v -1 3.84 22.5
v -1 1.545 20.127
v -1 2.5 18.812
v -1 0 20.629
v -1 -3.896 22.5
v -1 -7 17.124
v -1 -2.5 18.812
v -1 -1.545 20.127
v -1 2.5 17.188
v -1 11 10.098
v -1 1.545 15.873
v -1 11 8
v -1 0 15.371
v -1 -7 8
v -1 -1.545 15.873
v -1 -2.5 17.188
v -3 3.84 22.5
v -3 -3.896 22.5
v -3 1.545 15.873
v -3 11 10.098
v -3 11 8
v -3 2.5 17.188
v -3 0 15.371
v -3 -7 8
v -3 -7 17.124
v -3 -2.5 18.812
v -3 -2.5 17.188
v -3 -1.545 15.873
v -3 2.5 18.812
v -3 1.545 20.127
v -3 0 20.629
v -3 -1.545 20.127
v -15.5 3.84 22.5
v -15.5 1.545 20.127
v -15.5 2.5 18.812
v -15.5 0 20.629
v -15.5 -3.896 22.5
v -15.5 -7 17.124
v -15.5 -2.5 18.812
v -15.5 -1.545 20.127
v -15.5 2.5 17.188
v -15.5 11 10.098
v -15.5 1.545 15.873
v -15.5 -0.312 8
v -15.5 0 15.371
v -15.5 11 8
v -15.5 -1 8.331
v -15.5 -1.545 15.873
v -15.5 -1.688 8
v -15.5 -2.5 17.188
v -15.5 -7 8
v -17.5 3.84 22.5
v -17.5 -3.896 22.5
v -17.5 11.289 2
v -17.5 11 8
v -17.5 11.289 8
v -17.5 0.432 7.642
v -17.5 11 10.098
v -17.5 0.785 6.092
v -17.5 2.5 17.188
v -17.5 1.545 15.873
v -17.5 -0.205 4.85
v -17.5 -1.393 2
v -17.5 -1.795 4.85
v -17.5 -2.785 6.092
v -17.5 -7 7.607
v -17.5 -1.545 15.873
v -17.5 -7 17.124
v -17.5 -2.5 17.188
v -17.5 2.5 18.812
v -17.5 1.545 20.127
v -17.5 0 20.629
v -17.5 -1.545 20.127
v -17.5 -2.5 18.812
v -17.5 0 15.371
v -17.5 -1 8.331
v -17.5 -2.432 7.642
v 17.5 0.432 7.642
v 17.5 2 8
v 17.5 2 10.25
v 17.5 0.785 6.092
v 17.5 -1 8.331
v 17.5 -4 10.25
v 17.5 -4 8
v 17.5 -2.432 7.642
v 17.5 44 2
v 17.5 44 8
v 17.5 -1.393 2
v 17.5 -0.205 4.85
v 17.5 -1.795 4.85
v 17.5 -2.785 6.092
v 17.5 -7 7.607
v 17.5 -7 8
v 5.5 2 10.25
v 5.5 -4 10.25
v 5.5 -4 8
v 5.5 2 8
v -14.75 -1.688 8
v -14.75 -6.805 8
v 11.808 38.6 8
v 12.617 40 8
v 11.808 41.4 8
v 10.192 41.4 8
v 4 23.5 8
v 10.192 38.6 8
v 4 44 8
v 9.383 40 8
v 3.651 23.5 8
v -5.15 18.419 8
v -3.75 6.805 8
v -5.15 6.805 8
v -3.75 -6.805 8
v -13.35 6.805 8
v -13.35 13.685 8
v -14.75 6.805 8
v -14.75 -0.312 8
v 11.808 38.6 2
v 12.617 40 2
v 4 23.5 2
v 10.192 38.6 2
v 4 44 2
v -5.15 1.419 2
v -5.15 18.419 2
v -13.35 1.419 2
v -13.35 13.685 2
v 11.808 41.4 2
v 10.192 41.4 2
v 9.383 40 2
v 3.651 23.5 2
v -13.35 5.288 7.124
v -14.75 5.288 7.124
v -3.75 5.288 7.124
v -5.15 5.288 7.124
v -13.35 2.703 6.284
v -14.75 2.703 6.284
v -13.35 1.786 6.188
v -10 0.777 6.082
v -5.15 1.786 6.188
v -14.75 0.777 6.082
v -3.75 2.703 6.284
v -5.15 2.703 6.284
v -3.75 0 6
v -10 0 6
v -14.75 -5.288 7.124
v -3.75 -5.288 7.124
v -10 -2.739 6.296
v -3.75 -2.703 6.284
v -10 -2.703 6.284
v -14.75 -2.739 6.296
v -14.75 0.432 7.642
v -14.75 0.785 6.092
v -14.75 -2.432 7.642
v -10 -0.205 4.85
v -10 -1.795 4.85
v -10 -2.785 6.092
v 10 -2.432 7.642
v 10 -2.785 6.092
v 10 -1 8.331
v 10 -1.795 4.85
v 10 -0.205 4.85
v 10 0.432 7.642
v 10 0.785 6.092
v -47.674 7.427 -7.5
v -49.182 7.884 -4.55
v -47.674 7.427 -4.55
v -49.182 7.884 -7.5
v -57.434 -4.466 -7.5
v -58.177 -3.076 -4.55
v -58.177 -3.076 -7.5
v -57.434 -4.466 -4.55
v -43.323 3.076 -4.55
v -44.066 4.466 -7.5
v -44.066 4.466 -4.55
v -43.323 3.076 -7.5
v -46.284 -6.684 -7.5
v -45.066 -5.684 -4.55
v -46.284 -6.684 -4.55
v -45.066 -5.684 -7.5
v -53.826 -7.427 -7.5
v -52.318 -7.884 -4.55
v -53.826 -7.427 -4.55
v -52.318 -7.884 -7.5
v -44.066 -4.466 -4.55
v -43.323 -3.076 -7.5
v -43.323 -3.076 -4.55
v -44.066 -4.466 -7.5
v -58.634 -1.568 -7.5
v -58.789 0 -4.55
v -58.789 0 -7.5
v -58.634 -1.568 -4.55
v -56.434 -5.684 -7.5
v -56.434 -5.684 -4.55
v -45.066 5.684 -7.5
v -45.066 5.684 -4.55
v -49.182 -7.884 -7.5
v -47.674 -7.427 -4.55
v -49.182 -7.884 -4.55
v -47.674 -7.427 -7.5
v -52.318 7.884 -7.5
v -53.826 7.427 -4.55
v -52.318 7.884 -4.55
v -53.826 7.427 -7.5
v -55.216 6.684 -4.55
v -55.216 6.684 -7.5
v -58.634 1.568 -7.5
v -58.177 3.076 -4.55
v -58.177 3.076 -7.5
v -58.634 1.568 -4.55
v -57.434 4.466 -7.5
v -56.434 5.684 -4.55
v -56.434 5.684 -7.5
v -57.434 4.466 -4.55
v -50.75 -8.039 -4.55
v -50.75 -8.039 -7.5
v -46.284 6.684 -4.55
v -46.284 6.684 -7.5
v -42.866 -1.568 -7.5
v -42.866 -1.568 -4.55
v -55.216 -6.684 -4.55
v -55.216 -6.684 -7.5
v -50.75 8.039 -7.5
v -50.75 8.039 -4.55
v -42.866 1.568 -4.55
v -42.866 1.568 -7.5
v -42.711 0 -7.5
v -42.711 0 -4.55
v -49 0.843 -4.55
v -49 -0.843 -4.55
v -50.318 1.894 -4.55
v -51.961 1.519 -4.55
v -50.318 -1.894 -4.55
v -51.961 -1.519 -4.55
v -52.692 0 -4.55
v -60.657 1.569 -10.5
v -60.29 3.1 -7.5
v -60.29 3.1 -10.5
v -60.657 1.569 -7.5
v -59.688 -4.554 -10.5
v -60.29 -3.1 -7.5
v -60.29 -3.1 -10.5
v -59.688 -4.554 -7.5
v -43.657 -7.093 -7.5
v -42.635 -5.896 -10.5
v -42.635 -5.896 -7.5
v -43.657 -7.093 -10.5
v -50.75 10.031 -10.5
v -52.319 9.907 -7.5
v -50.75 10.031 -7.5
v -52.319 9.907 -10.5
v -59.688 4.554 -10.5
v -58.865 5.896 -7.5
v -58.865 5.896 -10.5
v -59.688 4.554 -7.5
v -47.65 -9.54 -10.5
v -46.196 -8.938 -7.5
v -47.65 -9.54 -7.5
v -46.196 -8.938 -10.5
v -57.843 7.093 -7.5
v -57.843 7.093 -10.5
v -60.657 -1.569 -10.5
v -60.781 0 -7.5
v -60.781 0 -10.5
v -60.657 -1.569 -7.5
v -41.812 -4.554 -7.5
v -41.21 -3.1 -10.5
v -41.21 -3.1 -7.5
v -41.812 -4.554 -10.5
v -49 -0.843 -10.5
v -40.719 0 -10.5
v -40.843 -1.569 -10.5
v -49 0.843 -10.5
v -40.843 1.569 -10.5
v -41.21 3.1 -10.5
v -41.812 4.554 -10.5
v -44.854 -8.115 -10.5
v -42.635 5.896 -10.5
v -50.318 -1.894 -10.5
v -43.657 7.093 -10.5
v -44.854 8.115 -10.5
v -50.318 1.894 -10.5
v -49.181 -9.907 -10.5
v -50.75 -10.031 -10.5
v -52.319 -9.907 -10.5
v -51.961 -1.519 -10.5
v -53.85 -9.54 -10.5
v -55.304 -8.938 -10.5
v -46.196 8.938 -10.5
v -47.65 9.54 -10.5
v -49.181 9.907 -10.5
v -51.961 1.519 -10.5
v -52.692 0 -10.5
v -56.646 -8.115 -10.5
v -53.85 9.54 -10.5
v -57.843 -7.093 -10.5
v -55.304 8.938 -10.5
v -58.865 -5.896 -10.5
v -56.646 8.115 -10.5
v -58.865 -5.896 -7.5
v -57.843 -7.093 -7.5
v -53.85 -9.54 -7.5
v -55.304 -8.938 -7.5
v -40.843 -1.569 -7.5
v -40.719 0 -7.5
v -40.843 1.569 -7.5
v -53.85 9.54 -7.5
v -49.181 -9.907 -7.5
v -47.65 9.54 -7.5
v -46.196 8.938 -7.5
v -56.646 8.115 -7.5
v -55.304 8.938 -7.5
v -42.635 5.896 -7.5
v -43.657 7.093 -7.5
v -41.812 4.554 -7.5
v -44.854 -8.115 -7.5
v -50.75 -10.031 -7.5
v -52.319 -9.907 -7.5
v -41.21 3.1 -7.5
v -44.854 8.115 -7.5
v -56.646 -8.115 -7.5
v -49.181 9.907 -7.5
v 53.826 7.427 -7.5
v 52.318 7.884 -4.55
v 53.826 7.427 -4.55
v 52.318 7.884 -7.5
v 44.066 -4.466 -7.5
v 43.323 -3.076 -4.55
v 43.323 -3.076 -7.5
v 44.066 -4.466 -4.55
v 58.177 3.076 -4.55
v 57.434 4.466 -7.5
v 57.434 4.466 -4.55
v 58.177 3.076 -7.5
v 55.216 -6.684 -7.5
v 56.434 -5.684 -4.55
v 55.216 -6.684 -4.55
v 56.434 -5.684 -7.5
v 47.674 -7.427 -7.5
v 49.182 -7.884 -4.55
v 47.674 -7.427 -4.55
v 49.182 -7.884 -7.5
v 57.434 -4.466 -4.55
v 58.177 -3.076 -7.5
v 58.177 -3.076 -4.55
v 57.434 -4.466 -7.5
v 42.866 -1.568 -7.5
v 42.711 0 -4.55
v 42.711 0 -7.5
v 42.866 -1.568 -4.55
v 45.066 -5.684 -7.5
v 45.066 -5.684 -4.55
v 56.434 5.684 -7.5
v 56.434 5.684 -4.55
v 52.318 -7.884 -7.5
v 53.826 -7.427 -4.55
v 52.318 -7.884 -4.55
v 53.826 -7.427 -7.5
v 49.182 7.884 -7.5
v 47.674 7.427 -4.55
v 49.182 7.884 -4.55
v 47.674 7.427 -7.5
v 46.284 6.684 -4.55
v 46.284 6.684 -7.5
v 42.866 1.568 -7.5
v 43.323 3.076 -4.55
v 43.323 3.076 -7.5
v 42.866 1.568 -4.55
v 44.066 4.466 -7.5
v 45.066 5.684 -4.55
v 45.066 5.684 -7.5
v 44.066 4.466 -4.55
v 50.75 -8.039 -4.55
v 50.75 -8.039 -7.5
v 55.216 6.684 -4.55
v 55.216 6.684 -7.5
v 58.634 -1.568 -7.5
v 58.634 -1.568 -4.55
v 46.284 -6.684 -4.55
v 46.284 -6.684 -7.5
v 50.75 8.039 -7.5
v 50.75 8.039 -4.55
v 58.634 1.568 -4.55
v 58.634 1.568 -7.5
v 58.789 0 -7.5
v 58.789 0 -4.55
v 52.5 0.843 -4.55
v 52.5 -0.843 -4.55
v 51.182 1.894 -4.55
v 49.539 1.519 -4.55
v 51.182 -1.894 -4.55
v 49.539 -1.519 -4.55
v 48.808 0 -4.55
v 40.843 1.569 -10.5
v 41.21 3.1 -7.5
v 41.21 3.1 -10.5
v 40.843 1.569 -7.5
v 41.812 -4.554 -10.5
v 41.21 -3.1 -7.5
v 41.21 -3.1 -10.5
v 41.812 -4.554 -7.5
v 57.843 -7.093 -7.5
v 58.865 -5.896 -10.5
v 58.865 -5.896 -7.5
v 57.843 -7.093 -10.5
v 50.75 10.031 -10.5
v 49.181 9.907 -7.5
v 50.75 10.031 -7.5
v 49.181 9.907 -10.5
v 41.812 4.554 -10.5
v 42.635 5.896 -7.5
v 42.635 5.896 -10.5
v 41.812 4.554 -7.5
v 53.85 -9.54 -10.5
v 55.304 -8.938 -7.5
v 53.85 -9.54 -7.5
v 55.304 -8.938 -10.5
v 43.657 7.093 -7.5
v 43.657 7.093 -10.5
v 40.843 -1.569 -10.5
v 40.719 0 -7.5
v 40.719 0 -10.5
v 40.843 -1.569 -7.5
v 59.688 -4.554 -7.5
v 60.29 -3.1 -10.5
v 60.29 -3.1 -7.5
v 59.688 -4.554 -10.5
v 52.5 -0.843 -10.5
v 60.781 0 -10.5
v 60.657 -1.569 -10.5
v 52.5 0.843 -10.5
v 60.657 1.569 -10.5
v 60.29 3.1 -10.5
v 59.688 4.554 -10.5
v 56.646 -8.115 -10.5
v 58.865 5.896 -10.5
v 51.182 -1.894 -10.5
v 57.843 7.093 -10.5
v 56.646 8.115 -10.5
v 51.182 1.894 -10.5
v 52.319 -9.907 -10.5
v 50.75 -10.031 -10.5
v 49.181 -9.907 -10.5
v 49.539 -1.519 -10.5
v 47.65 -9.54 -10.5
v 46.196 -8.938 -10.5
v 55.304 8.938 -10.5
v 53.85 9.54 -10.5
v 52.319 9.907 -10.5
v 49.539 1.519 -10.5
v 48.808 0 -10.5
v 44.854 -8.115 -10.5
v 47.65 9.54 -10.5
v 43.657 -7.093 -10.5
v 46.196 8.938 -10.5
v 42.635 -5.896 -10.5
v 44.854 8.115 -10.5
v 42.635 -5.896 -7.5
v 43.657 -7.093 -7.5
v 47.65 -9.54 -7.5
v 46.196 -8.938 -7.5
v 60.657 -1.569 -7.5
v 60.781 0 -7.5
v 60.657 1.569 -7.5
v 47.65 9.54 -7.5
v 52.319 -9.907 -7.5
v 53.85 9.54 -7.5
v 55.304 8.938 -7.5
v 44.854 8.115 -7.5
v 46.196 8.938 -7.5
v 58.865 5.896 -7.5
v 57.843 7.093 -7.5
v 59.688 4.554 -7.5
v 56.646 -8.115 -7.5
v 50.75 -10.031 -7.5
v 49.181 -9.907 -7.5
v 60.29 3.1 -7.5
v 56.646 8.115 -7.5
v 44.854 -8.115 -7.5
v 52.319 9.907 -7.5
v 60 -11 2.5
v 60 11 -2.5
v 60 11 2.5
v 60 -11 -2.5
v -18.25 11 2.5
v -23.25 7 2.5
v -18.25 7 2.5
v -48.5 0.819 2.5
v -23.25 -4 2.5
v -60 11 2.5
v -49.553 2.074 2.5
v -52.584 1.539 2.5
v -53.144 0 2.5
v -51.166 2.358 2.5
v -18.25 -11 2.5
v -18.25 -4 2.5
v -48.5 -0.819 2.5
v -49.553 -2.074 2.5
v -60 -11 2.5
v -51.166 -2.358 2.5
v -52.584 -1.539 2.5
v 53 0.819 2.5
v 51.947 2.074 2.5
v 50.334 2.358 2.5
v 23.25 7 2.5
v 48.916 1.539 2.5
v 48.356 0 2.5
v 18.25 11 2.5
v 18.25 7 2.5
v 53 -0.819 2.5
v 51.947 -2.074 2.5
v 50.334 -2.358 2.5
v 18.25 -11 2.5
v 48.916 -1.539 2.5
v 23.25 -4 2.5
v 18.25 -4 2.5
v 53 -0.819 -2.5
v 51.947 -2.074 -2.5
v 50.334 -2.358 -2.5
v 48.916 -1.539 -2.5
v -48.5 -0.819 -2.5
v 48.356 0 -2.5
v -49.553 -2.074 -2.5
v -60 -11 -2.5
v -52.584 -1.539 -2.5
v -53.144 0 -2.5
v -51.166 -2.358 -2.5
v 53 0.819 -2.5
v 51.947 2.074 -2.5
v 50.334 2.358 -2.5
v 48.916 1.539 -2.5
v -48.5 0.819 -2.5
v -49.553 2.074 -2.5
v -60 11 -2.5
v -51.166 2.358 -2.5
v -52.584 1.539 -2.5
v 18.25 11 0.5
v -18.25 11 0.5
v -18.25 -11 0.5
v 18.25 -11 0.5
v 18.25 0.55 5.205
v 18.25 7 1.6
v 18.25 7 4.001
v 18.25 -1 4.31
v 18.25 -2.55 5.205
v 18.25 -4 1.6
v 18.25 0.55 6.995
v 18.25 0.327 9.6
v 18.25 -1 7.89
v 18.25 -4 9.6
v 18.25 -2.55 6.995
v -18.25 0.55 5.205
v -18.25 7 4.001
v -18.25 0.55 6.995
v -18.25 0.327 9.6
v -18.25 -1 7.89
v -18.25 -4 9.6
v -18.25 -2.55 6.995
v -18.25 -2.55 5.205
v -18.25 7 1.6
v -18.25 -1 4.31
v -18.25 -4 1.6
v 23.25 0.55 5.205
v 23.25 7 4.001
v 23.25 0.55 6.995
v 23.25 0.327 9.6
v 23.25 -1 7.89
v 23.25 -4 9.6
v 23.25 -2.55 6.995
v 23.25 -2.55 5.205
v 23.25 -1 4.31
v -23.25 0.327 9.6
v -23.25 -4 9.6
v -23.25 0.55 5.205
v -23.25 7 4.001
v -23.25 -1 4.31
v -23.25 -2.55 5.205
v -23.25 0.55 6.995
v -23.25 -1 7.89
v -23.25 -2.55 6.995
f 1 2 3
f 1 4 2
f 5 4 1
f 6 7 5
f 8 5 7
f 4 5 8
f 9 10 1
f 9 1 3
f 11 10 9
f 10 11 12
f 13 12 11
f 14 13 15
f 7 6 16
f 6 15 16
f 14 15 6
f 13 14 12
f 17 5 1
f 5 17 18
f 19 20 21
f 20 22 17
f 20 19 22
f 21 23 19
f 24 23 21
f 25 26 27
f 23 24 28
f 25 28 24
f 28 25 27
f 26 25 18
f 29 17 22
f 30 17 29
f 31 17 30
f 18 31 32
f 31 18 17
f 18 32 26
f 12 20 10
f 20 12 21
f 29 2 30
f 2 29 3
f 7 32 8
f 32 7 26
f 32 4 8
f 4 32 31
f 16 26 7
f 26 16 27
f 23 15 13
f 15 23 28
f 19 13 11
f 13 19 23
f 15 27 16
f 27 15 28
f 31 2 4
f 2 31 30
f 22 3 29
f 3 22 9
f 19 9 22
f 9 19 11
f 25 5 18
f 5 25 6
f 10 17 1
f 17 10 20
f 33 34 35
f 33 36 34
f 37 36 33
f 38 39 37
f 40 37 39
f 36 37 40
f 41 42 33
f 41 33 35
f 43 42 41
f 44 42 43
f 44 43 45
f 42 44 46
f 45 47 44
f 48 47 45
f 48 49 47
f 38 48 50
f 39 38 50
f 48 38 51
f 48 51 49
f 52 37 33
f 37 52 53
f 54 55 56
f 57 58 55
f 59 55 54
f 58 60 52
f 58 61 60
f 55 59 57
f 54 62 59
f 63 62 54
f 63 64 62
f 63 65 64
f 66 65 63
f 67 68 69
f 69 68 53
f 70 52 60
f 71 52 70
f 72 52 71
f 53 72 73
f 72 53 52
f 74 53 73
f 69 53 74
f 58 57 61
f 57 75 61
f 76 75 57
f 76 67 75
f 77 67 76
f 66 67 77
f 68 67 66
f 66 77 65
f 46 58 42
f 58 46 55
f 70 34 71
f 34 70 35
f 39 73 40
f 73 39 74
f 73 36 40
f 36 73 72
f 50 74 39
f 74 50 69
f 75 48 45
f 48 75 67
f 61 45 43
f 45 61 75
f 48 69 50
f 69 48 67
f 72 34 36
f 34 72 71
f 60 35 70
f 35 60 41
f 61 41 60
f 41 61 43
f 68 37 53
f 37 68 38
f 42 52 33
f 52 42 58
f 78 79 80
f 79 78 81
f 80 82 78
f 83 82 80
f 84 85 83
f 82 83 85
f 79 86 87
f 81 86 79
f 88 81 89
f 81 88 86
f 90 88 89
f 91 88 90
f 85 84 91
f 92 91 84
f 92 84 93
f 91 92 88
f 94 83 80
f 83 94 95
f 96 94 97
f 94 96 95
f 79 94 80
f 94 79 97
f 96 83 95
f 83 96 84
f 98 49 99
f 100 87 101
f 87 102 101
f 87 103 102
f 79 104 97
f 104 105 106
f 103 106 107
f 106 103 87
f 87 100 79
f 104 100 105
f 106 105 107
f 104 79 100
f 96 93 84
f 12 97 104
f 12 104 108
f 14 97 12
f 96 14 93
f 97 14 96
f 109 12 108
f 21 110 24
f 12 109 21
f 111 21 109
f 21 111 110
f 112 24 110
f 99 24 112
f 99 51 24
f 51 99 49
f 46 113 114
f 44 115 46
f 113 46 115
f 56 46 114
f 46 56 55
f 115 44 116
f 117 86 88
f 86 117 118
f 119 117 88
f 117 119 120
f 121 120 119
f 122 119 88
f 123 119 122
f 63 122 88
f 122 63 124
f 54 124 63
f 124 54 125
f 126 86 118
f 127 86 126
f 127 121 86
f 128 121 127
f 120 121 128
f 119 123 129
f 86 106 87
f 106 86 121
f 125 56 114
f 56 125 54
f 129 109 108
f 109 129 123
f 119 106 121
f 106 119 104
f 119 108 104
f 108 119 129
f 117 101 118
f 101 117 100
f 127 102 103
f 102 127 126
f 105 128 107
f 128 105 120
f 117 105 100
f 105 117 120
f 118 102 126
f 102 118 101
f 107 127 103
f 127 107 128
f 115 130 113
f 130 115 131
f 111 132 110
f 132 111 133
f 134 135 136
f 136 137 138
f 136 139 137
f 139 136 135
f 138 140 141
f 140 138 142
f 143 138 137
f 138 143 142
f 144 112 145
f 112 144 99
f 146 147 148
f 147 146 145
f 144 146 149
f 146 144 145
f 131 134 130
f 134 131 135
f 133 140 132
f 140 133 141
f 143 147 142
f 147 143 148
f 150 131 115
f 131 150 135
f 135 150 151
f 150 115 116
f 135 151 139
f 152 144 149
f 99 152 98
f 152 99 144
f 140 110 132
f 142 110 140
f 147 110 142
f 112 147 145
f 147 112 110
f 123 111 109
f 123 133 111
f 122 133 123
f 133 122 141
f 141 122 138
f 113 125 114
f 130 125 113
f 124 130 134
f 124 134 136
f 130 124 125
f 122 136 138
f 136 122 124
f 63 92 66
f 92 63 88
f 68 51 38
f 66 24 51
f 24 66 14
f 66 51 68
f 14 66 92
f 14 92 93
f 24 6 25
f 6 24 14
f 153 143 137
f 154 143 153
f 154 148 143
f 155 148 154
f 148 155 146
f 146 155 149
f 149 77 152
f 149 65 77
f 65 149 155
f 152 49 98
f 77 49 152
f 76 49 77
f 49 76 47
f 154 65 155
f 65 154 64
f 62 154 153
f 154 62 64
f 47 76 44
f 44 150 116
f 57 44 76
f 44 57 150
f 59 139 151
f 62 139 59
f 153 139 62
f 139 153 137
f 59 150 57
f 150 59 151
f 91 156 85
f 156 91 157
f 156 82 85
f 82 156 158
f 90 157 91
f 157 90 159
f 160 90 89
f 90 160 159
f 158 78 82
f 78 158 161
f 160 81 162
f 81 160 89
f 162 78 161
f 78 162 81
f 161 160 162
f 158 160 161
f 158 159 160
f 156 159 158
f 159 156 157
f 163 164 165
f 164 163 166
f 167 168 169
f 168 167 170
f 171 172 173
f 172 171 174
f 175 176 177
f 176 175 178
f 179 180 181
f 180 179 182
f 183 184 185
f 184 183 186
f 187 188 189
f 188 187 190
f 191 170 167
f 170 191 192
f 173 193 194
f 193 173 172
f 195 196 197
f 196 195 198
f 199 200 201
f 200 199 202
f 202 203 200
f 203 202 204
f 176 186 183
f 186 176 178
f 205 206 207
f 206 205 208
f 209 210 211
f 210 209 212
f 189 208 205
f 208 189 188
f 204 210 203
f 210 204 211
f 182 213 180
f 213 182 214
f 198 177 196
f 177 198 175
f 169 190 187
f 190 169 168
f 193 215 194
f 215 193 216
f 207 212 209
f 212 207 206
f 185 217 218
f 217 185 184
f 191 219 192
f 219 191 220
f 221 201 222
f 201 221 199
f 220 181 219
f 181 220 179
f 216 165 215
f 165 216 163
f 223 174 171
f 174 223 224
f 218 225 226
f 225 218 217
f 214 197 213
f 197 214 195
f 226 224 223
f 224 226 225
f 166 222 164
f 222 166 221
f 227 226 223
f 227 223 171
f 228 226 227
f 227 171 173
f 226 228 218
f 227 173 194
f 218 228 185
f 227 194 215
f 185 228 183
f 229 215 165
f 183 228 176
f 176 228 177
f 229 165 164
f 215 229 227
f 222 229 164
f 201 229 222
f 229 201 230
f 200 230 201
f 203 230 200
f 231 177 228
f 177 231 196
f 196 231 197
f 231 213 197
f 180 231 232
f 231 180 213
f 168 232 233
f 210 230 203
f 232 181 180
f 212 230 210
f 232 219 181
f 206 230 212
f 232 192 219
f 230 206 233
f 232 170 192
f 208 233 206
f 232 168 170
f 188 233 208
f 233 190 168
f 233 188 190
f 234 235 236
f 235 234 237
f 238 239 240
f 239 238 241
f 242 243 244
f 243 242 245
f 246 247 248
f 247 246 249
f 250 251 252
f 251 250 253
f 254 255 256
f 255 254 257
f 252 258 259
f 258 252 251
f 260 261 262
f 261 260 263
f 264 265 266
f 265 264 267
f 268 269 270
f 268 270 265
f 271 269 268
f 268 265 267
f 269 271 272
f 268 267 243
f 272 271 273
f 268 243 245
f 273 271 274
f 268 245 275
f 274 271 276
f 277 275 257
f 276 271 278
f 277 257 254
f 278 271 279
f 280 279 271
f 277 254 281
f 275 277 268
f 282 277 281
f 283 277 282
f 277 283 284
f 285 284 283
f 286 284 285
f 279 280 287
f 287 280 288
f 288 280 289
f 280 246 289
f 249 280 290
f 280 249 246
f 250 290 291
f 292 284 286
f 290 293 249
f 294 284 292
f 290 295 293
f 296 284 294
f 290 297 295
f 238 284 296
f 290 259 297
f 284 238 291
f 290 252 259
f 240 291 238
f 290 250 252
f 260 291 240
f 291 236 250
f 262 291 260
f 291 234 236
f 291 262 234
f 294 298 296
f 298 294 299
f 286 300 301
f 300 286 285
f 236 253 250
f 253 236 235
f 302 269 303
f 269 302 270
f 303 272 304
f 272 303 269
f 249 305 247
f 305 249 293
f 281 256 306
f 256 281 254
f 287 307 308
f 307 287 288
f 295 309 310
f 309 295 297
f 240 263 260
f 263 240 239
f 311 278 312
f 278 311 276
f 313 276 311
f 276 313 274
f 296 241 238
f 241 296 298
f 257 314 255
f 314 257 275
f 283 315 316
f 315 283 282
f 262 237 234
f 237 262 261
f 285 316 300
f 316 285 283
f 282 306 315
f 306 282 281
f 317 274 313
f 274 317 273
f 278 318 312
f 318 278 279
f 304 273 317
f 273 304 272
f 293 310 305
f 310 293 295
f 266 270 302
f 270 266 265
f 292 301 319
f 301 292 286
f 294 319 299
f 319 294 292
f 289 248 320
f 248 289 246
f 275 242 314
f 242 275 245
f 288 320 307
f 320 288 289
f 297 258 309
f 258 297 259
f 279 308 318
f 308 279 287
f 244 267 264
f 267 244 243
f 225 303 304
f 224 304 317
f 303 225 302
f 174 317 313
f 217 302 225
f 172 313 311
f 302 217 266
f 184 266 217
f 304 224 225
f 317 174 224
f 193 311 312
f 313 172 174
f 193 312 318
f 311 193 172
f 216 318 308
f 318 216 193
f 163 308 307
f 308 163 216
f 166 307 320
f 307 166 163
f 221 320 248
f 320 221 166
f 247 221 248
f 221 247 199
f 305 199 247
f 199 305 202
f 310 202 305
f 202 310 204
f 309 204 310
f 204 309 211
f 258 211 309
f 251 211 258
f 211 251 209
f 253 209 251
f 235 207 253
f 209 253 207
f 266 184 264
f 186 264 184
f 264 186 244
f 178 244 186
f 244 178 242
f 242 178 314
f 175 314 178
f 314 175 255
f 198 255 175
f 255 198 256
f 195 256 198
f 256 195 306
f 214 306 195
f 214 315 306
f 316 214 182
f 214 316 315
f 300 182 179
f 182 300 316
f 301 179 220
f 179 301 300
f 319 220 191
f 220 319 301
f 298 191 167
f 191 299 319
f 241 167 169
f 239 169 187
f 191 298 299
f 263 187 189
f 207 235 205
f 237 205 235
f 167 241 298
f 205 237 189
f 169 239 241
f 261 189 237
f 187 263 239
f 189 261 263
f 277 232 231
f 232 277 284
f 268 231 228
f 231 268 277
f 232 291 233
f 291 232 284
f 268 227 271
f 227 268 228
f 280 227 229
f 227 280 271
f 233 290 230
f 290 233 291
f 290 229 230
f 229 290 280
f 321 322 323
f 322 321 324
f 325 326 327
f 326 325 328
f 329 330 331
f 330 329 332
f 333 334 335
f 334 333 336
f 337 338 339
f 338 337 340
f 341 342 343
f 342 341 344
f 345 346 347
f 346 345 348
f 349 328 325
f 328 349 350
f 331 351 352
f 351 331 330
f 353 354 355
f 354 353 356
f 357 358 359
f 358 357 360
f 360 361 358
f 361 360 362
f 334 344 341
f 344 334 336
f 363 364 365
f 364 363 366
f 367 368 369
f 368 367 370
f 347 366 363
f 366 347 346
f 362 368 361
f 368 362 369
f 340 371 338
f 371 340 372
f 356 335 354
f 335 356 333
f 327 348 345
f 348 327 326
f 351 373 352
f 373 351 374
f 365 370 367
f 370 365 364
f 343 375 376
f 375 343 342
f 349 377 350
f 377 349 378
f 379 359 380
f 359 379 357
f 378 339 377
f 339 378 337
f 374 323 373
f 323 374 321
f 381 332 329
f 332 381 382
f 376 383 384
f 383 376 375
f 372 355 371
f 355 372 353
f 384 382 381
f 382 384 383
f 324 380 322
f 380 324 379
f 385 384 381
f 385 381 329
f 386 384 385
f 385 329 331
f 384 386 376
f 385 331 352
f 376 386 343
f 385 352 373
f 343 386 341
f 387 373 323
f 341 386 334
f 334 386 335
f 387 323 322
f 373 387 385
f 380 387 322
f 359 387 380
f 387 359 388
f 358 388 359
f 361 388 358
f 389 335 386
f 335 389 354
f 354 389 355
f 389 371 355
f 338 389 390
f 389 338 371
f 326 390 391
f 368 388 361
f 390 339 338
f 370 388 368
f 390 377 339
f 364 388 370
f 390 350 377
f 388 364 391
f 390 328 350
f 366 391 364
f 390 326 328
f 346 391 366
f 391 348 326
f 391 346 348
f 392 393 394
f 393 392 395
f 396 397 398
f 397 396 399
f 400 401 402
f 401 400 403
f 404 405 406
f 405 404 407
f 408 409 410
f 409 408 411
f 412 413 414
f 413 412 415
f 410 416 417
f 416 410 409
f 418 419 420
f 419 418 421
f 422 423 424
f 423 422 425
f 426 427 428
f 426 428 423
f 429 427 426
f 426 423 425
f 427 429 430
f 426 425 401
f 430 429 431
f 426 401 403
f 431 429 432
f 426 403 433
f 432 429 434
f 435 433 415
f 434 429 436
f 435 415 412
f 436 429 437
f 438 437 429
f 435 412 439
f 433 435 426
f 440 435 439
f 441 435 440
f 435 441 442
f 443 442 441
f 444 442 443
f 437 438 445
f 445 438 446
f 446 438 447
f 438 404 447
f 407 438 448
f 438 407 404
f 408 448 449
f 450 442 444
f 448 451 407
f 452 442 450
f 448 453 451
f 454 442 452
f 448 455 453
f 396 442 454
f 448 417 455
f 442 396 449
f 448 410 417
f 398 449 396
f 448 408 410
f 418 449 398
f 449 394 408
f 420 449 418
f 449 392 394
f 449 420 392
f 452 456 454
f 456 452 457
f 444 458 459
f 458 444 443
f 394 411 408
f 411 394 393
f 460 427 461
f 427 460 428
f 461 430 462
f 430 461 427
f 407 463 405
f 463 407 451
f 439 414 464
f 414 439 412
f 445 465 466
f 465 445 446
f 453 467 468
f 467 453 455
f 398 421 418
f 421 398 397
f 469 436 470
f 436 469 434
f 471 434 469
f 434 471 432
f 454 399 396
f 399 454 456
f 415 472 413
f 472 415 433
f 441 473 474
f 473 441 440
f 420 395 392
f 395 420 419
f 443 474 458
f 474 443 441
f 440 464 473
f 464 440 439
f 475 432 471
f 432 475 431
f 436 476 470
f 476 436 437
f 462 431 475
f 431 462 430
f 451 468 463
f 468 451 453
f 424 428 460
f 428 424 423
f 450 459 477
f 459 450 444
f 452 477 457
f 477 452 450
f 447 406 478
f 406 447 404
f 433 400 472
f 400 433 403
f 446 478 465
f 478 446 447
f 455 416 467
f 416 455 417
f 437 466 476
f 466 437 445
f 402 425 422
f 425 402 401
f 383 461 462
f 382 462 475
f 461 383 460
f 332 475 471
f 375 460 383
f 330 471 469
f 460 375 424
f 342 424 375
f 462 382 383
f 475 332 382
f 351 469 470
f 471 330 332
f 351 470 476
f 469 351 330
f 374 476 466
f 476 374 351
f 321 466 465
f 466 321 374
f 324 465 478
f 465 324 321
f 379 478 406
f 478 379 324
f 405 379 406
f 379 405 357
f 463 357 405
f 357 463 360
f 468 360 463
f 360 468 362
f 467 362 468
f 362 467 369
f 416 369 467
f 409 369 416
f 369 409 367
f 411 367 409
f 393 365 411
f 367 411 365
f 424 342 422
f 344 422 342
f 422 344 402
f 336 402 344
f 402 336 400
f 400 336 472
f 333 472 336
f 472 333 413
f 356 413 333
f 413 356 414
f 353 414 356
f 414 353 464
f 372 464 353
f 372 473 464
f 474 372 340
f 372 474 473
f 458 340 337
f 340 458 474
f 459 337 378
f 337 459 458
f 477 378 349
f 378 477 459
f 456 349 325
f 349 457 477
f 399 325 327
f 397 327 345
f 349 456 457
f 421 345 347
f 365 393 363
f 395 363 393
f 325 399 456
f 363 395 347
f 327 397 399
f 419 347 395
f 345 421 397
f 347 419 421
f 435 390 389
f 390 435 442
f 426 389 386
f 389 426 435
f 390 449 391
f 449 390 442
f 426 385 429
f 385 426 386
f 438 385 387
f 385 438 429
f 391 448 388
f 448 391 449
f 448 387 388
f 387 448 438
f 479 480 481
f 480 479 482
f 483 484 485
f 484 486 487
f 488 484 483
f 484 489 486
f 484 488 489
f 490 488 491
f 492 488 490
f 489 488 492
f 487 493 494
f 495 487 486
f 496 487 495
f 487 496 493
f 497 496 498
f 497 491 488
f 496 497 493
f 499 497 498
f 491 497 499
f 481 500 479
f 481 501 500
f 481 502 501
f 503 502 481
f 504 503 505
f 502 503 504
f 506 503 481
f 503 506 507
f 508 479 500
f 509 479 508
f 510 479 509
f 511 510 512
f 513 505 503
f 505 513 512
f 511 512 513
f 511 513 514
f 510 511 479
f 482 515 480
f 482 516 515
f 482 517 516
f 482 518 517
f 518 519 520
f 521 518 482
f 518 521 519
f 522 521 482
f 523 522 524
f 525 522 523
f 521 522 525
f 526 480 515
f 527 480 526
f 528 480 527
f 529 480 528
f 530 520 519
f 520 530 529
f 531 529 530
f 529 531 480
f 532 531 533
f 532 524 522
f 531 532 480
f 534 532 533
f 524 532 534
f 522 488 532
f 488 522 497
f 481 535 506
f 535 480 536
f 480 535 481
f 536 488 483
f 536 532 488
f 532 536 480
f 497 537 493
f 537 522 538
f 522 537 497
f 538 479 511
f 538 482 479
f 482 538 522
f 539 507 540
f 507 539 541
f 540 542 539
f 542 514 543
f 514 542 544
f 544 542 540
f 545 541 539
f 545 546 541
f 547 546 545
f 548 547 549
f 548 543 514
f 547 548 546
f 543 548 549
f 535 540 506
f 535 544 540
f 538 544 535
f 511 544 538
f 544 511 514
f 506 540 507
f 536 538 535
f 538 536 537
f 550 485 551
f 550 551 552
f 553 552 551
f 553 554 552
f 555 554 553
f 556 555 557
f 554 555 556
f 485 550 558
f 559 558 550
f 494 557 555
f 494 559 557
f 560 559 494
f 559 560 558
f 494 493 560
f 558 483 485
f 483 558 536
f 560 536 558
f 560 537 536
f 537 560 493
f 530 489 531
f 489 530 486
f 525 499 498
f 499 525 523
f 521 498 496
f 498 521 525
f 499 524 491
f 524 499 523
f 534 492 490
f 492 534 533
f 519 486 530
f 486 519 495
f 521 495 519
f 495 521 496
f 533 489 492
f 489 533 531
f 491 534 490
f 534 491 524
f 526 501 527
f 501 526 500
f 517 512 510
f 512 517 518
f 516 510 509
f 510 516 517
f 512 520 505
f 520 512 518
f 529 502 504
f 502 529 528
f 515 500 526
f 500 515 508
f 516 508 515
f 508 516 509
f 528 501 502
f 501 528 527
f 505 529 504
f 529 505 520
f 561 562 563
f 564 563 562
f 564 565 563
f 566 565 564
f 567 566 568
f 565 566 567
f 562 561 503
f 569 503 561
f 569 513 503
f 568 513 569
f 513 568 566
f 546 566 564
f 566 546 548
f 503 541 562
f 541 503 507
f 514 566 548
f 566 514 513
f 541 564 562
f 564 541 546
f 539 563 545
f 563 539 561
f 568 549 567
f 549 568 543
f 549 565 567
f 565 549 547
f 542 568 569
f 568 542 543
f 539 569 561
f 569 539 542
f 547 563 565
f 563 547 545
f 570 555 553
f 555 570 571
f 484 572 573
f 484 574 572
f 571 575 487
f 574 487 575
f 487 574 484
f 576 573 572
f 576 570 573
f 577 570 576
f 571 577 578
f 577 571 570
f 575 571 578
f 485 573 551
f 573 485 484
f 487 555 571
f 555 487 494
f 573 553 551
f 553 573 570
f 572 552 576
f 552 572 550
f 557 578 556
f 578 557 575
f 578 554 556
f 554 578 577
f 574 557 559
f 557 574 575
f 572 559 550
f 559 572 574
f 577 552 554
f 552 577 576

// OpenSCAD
//Y-Belt tensioner for a Velleman K8200 / 3Drag 3D Printer

//HOW TO PRINT
//Export each part individually (except the washers, both can be done together)
//to an stl file, by commenting out different portions at the end of this file. 
//
//Assemble them on the platter inside your favourite slicer program.
//Slice, print, enjoy (etc).
//

//
//=======================================================================================
//polyhole module by nophead: http://www.thingiverse.com/thing:6118
module polyhole(h, d) {
    n = max(round(2 * d),3);
    rotate([0,0,180])
        cylinder(h = h, r = (d / 2) / cos (180 / n), $fn = n,center=true);
}
//End polyhole
//=======================================================================================
//Pulley Clearance
module pulley(d,h)
{
rotate([0,90,0])cylinder(d=d,h=h,center=true,$fn=30);
}
//End pulley
//=======================================================================================
//The Tensioner
module tensioner()
	{
		module bearing_mounts()
			{
				difference()
					{
						cube([2,22,15],center=true);
						translate([0,0,3])rotate([0,90,0])bore(d=5,h=60);
						translate([0,-14,5])rotate([60,0,0])cube([8,22,15],center=true);
						translate([0,12.5,7.5])rotate([-60,0,0])cube([8,22,15],center=true);
					}
			}
			
			difference()
				{
					union()
						{
							translate([-2,0,15])bearing_mounts();
							translate([-16.5,0,15])bearing_mounts();
							translate([11.5,-1,9])cube([12,6,2.5],center=true);
							translate([0,16.5,5])cube([35,55,6],center=true); //main bit
						} 
					translate([-18,11,0])rotate([0,0,30])cube([25,30,15]); //angled bit
					translate([-21,23.5,0])cube([25,30,15]); //top
					translate([11,40,6.5])bore(d=2.8,h=10); //tension screw
					translate([-9.25,0,19])pulley(d=26,h=11);
					translate([-9.25,12,8.2])rotate([-5,0,0])cube([8.2,20,15],center=true); //belt cutout
					translate([0,-10,0])rotate([-45,0,0])cube([50,20,15],center=true);
					translate([0,-17,15])cube([50,20,15],center=true);
					translate([-15,-1,6.5])rotate([0,90,0])bore(d=3.3,h=10);
					translate([15,-1,6.5])rotate([0,90,0])bore(d=3.3,h=10);
				}	
	}
//End Tensioner
//=======================================================================================
//Washers
module washers()
	{
		difference()
			{
				union()
					{
						translate([0,0,2.9])polyhole(d=16,h=3.1);
						polyhole(d=20,h=3);
					}
				bore(d=3.5,h=10);
			}
	}
//End Washers
//=======================================================================================
//The Base
module base()
	{
		module tens_mounts()
			{
					difference()
						{
							cube([5,11,8],center=true);
							translate([0,5,6])rotate([50,0,0])cube([7,11,11],center=true);
							translate([0,-2.5,0.5])rotate([0,90,0])bore(d=3.1,h=80);
						}
			}
		union()
			{
				difference()
					{
					cube([120,22,5],center=true); //main bit
					translate([0,0,2])cube([36.5,30,3],center=true);
					translate([-50.75,0,0])polyhole(d=4.5,h=10);
					translate([50.75,0,0])polyhole(d=4.5,h=10);
					}
				translate([20.75,1.5,5.6])tens_mounts();
				translate([-20.75,1.5,5.6])tens_mounts();
			}
	}



//End Base
//=======================================================================================
//Bore for cutting holes in stuff
module bore(d,h)
	{
		polyhole(h,d);
	}
//=======================================================================================

//pulley standin do not print this part. used only for design and included if
//position of pully needs to be adjusted later
//translate([-9.4,0,19])pulley(d=20,h=11); //creates a mock pulley to assist in positioning
//
//
//
//The Tensioner
tensioner(); 

//Washers
translate([-50.75,0,-9])washers();
translate([50.75,0,-9])washers();

//Main Base
base();
		
